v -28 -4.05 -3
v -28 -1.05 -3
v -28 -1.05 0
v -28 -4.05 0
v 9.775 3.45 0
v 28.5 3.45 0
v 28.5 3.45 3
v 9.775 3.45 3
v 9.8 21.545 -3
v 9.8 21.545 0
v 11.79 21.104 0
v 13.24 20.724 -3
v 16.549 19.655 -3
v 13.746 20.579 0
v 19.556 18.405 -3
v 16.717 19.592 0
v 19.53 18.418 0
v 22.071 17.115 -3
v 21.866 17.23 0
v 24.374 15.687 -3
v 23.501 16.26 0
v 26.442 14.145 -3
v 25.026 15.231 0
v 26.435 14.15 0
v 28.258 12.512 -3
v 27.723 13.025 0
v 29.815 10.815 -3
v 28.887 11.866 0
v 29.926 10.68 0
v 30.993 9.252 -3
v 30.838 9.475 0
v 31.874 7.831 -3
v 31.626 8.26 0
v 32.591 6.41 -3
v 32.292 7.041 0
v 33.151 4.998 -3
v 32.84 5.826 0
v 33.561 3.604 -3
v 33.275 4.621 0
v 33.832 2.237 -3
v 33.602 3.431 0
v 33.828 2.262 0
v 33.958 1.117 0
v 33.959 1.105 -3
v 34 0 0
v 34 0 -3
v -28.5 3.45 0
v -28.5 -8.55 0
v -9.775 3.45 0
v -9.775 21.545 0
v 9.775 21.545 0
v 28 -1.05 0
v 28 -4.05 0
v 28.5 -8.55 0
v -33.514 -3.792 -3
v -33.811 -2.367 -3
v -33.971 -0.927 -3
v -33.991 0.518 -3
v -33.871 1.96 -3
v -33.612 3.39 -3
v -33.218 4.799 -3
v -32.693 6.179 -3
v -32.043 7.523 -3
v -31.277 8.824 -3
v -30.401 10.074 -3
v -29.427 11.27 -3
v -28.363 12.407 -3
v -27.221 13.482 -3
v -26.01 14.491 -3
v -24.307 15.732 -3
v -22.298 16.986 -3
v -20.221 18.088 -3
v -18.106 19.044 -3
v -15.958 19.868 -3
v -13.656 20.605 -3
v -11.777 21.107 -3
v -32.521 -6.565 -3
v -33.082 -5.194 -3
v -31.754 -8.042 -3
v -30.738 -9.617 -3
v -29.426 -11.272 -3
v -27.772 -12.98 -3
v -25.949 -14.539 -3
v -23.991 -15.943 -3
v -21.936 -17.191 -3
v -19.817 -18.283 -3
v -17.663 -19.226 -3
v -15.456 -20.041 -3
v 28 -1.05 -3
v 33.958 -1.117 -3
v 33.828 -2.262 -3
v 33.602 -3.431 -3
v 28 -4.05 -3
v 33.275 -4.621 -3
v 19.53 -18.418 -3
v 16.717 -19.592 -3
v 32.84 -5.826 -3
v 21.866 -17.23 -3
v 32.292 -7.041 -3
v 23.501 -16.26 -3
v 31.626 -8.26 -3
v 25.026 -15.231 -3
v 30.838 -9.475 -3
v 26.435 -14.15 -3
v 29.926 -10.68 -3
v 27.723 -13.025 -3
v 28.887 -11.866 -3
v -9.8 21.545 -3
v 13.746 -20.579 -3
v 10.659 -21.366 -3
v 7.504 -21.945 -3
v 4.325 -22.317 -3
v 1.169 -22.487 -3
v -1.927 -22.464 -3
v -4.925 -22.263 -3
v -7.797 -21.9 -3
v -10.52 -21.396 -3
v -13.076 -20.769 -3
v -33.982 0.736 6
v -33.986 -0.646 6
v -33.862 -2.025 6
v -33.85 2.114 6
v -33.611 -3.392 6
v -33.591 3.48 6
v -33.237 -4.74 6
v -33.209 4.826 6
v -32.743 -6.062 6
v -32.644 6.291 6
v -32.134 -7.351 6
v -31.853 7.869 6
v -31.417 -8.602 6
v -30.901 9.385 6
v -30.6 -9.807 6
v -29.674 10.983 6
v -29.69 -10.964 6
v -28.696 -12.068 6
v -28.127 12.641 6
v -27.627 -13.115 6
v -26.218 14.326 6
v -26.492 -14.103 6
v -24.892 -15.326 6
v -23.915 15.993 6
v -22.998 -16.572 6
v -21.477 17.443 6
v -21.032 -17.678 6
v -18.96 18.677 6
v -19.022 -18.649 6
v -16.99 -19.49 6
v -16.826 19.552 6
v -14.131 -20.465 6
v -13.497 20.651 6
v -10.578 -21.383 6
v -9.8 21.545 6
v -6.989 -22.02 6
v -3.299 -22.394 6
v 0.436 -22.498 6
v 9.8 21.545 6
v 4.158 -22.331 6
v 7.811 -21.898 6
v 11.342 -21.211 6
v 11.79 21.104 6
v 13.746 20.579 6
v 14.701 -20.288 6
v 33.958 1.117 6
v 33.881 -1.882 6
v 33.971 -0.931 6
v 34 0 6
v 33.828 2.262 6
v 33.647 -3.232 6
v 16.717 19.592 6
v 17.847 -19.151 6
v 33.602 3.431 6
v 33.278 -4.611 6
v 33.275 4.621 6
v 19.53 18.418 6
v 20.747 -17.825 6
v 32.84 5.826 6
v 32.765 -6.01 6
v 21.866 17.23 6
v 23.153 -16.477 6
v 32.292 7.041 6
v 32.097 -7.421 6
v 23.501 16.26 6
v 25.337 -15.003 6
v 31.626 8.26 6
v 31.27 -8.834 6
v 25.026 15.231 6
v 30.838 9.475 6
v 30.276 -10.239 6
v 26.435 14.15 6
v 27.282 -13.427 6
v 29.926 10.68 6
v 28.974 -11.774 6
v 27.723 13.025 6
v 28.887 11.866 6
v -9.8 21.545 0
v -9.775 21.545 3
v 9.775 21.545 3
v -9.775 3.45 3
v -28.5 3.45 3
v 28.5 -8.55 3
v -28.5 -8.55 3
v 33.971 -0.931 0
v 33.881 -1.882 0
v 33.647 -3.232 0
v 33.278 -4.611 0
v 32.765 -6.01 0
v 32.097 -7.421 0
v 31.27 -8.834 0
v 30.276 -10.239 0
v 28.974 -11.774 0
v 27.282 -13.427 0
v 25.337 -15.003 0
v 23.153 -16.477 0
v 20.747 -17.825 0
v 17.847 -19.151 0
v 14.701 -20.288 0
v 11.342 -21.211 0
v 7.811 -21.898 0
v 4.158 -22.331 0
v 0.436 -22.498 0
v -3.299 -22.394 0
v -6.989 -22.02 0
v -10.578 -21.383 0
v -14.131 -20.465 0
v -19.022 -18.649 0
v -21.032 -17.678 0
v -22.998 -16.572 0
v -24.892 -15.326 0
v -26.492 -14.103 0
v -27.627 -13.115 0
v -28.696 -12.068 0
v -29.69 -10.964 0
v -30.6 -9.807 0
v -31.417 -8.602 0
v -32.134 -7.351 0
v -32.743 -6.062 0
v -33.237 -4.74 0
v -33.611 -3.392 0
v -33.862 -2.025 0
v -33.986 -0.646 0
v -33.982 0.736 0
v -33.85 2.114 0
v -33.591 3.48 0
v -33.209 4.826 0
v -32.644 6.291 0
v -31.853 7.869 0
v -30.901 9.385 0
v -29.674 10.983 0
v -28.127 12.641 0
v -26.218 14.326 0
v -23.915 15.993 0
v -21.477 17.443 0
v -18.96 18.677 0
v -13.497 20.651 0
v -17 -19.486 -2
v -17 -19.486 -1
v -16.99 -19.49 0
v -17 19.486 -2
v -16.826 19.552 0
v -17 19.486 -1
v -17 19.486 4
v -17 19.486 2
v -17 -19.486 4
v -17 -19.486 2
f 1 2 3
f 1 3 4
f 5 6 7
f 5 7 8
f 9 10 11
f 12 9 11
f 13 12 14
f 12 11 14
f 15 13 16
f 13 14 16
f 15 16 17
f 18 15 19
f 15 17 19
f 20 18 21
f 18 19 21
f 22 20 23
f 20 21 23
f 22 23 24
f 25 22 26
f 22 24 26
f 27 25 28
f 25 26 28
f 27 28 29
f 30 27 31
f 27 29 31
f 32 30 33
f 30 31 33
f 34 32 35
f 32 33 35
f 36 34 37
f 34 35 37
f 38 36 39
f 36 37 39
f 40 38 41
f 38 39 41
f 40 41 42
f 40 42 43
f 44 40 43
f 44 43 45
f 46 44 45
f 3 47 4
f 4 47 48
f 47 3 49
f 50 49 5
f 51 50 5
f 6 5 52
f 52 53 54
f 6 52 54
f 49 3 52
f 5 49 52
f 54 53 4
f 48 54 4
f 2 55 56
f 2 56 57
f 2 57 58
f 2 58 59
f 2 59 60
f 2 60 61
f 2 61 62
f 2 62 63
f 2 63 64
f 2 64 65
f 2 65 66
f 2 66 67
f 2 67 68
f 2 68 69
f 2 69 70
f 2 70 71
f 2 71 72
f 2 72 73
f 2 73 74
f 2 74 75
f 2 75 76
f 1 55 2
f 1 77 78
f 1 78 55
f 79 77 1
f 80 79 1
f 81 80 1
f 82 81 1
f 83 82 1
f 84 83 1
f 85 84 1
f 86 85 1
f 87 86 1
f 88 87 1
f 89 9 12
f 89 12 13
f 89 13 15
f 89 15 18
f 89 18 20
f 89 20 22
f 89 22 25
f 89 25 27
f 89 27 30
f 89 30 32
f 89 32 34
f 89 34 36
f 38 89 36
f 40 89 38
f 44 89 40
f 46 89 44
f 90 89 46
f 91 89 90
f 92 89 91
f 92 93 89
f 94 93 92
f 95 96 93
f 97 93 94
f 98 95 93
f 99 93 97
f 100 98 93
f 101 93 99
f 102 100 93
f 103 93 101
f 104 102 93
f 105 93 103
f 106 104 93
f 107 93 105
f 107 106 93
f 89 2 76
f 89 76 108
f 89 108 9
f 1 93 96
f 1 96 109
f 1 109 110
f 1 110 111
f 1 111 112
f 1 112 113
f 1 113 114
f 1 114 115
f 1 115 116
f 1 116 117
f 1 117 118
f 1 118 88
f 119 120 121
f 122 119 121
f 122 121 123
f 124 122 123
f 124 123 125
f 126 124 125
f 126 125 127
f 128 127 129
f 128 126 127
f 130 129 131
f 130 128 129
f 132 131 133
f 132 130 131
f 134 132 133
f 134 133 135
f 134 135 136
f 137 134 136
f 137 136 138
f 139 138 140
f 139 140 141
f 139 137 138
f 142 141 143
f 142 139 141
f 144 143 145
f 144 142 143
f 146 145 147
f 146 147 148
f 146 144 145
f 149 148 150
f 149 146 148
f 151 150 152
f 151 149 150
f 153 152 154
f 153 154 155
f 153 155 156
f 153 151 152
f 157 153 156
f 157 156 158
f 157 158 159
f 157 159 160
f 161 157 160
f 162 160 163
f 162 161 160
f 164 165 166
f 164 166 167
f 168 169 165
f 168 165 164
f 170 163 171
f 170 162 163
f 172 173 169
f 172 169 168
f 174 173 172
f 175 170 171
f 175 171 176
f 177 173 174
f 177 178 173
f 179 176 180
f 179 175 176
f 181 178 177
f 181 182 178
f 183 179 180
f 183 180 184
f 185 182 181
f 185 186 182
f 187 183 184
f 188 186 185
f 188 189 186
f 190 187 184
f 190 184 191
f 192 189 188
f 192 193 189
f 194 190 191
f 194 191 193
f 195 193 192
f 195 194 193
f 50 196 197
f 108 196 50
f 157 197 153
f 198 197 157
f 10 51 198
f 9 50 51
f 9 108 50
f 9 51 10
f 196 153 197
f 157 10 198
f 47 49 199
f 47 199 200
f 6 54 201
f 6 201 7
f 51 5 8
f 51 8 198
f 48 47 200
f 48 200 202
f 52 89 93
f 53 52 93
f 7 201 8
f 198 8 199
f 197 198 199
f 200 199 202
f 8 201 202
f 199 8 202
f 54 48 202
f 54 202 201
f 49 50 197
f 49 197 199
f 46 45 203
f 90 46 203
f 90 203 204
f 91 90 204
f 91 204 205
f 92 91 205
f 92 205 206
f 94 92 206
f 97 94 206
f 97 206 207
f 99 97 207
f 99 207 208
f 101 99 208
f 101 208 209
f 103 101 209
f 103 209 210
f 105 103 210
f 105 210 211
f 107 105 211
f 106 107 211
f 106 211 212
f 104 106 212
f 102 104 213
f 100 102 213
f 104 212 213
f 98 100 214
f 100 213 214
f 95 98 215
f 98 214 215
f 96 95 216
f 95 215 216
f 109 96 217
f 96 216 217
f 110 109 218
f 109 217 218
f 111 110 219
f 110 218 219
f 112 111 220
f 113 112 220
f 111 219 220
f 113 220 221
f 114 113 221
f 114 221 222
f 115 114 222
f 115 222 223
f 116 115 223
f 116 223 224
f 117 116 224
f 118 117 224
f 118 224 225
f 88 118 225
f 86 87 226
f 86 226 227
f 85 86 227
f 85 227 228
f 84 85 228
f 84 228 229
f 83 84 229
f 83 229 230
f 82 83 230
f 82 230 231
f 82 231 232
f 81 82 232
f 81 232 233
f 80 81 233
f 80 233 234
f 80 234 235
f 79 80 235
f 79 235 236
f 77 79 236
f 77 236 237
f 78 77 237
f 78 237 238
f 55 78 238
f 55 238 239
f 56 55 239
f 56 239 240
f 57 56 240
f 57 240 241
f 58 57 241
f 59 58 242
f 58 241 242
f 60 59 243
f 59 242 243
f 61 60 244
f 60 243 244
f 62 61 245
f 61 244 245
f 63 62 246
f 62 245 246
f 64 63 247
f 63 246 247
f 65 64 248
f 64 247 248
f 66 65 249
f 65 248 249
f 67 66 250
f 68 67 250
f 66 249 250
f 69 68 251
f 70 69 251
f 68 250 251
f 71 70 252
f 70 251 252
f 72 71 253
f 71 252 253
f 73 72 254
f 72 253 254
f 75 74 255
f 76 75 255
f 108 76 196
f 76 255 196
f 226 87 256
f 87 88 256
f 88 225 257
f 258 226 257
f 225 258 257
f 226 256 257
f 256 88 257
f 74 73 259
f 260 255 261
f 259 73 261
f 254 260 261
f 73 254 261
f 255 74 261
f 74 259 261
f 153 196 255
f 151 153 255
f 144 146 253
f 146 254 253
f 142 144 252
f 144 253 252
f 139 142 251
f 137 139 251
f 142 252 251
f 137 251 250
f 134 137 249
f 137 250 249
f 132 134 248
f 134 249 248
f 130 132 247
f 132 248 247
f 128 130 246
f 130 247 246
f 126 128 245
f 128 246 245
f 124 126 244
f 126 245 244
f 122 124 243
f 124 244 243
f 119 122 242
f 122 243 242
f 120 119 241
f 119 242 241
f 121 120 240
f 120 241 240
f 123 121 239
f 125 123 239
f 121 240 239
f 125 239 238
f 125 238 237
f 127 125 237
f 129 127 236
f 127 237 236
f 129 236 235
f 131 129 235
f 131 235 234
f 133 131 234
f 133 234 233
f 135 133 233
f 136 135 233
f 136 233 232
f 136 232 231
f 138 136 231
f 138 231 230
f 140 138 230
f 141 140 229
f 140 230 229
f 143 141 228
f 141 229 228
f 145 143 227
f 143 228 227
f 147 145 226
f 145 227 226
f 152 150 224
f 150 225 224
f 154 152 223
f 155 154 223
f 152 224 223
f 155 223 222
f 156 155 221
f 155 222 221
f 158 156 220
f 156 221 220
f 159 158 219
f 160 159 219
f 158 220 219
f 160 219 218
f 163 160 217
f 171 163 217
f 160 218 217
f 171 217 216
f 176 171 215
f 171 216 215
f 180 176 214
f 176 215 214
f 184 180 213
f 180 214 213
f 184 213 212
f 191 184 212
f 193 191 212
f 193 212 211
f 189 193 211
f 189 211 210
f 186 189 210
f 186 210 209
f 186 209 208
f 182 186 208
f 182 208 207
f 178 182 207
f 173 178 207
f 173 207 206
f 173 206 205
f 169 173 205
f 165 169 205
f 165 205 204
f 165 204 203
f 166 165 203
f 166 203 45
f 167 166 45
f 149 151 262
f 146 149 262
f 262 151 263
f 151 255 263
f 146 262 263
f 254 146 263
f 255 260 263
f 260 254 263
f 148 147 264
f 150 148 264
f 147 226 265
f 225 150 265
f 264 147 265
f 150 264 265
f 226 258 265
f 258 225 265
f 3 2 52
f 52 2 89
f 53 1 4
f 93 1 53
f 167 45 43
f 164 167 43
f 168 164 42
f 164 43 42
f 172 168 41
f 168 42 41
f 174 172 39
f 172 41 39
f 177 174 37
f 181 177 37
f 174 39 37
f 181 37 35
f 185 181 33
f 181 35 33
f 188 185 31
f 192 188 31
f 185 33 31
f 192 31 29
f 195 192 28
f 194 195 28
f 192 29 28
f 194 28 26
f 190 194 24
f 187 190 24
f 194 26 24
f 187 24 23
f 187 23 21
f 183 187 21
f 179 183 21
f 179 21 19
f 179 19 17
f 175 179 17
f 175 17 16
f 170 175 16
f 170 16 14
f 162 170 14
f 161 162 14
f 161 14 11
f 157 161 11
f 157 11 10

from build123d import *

# Parameters (mm, degrees)
PAD_DEPTH       = 6
POCKET_DEPTH    = 3
PAD001_DEPTH    = 3
SKETCH003_W     = 56
SKETCH003_H     = 3
POCKET001_DEPTH = 3
SKETCH004_W     = 19.6
SKETCH004_H     = 1
POCKET002_DEPTH = 9.001


with BuildPart() as part:
    # Sketch → Pad (new body)
    with BuildSketch(Plane.XY):
        with BuildLine():
            add(Edge.make_bspline(
                [(34, 0), (34, 38.971143), (-17, 19.485572), (-68, 0), (-17, -19.485572), (34, -38.971143), (34, 0)],
                knots=[0, 0, 0, 2.094395, 2.094395, 4.18879, 4.18879, 6.283185, 6.283185, 6.283185], degree=2, weights=[1, 0.5, 1, 0.5, 1, 0.5, 1]))
        make_face()
    extrude(amount=PAD_DEPTH)

    # Sketch001 (on Face2 of Pad) → Pocket (cut)
    with BuildSketch(Plane(origin=(0, 0, 0), x_dir=(1, 0, 0), z_dir=(0, 0, -1))):
        Polygon((9.775, -3.450064), (9.775, -21.550064), (-9.775, -21.550064), (-9.775, -3.450064), (-28.5, -3.450064), (-28.5, 8.549936), (28.5, 8.549936), (28.5, -3.450064), align=None)
    extrude(amount=-POCKET_DEPTH, mode=Mode.SUBTRACT)

    # Sketch002 (on Face2 of Pocket) → Pad001 (join)
    with BuildSketch(Plane(origin=(0, 0, 0), x_dir=(1, 0, 0), z_dir=(0, 0, -1))):
        with BuildLine():
            add(Edge.make_bspline(
                [(34, 0), (34, 38.971143), (-17, 19.485572), (-68, 0), (-17, -19.485572), (34, -38.971143), (34, 0)],
                knots=[0, 0, 0, 2.094395, 2.094395, 4.18879, 4.18879, 6.283185, 6.283185, 6.283185], degree=2, weights=[1, 0.5, 1, 0.5, 1, 0.5, 1]))
        make_face()
    extrude(amount=PAD001_DEPTH)

    # Sketch003 (on Face4 of Pad001) → Pocket001 (cut)
    with BuildSketch(Plane(origin=(0, 0, -3), x_dir=(1, 0, 0), z_dir=(0, 0, -1))):
        with Locations((0, 2.549936)):
            Rectangle(SKETCH003_W, SKETCH003_H)
    extrude(amount=-POCKET001_DEPTH, mode=Mode.SUBTRACT)

    # Sketch004 (on Face4 of Pocket001) → Pocket002 (cut, through all)
    with BuildSketch(Plane(origin=(0, 0, -3), x_dir=(1, 0, 0), z_dir=(0, 0, -1))):
        with Locations((0, -22.045091)):
            Rectangle(SKETCH004_W, SKETCH004_H)
    extrude(amount=-POCKET002_DEPTH, mode=Mode.SUBTRACT)


solid = part.part
